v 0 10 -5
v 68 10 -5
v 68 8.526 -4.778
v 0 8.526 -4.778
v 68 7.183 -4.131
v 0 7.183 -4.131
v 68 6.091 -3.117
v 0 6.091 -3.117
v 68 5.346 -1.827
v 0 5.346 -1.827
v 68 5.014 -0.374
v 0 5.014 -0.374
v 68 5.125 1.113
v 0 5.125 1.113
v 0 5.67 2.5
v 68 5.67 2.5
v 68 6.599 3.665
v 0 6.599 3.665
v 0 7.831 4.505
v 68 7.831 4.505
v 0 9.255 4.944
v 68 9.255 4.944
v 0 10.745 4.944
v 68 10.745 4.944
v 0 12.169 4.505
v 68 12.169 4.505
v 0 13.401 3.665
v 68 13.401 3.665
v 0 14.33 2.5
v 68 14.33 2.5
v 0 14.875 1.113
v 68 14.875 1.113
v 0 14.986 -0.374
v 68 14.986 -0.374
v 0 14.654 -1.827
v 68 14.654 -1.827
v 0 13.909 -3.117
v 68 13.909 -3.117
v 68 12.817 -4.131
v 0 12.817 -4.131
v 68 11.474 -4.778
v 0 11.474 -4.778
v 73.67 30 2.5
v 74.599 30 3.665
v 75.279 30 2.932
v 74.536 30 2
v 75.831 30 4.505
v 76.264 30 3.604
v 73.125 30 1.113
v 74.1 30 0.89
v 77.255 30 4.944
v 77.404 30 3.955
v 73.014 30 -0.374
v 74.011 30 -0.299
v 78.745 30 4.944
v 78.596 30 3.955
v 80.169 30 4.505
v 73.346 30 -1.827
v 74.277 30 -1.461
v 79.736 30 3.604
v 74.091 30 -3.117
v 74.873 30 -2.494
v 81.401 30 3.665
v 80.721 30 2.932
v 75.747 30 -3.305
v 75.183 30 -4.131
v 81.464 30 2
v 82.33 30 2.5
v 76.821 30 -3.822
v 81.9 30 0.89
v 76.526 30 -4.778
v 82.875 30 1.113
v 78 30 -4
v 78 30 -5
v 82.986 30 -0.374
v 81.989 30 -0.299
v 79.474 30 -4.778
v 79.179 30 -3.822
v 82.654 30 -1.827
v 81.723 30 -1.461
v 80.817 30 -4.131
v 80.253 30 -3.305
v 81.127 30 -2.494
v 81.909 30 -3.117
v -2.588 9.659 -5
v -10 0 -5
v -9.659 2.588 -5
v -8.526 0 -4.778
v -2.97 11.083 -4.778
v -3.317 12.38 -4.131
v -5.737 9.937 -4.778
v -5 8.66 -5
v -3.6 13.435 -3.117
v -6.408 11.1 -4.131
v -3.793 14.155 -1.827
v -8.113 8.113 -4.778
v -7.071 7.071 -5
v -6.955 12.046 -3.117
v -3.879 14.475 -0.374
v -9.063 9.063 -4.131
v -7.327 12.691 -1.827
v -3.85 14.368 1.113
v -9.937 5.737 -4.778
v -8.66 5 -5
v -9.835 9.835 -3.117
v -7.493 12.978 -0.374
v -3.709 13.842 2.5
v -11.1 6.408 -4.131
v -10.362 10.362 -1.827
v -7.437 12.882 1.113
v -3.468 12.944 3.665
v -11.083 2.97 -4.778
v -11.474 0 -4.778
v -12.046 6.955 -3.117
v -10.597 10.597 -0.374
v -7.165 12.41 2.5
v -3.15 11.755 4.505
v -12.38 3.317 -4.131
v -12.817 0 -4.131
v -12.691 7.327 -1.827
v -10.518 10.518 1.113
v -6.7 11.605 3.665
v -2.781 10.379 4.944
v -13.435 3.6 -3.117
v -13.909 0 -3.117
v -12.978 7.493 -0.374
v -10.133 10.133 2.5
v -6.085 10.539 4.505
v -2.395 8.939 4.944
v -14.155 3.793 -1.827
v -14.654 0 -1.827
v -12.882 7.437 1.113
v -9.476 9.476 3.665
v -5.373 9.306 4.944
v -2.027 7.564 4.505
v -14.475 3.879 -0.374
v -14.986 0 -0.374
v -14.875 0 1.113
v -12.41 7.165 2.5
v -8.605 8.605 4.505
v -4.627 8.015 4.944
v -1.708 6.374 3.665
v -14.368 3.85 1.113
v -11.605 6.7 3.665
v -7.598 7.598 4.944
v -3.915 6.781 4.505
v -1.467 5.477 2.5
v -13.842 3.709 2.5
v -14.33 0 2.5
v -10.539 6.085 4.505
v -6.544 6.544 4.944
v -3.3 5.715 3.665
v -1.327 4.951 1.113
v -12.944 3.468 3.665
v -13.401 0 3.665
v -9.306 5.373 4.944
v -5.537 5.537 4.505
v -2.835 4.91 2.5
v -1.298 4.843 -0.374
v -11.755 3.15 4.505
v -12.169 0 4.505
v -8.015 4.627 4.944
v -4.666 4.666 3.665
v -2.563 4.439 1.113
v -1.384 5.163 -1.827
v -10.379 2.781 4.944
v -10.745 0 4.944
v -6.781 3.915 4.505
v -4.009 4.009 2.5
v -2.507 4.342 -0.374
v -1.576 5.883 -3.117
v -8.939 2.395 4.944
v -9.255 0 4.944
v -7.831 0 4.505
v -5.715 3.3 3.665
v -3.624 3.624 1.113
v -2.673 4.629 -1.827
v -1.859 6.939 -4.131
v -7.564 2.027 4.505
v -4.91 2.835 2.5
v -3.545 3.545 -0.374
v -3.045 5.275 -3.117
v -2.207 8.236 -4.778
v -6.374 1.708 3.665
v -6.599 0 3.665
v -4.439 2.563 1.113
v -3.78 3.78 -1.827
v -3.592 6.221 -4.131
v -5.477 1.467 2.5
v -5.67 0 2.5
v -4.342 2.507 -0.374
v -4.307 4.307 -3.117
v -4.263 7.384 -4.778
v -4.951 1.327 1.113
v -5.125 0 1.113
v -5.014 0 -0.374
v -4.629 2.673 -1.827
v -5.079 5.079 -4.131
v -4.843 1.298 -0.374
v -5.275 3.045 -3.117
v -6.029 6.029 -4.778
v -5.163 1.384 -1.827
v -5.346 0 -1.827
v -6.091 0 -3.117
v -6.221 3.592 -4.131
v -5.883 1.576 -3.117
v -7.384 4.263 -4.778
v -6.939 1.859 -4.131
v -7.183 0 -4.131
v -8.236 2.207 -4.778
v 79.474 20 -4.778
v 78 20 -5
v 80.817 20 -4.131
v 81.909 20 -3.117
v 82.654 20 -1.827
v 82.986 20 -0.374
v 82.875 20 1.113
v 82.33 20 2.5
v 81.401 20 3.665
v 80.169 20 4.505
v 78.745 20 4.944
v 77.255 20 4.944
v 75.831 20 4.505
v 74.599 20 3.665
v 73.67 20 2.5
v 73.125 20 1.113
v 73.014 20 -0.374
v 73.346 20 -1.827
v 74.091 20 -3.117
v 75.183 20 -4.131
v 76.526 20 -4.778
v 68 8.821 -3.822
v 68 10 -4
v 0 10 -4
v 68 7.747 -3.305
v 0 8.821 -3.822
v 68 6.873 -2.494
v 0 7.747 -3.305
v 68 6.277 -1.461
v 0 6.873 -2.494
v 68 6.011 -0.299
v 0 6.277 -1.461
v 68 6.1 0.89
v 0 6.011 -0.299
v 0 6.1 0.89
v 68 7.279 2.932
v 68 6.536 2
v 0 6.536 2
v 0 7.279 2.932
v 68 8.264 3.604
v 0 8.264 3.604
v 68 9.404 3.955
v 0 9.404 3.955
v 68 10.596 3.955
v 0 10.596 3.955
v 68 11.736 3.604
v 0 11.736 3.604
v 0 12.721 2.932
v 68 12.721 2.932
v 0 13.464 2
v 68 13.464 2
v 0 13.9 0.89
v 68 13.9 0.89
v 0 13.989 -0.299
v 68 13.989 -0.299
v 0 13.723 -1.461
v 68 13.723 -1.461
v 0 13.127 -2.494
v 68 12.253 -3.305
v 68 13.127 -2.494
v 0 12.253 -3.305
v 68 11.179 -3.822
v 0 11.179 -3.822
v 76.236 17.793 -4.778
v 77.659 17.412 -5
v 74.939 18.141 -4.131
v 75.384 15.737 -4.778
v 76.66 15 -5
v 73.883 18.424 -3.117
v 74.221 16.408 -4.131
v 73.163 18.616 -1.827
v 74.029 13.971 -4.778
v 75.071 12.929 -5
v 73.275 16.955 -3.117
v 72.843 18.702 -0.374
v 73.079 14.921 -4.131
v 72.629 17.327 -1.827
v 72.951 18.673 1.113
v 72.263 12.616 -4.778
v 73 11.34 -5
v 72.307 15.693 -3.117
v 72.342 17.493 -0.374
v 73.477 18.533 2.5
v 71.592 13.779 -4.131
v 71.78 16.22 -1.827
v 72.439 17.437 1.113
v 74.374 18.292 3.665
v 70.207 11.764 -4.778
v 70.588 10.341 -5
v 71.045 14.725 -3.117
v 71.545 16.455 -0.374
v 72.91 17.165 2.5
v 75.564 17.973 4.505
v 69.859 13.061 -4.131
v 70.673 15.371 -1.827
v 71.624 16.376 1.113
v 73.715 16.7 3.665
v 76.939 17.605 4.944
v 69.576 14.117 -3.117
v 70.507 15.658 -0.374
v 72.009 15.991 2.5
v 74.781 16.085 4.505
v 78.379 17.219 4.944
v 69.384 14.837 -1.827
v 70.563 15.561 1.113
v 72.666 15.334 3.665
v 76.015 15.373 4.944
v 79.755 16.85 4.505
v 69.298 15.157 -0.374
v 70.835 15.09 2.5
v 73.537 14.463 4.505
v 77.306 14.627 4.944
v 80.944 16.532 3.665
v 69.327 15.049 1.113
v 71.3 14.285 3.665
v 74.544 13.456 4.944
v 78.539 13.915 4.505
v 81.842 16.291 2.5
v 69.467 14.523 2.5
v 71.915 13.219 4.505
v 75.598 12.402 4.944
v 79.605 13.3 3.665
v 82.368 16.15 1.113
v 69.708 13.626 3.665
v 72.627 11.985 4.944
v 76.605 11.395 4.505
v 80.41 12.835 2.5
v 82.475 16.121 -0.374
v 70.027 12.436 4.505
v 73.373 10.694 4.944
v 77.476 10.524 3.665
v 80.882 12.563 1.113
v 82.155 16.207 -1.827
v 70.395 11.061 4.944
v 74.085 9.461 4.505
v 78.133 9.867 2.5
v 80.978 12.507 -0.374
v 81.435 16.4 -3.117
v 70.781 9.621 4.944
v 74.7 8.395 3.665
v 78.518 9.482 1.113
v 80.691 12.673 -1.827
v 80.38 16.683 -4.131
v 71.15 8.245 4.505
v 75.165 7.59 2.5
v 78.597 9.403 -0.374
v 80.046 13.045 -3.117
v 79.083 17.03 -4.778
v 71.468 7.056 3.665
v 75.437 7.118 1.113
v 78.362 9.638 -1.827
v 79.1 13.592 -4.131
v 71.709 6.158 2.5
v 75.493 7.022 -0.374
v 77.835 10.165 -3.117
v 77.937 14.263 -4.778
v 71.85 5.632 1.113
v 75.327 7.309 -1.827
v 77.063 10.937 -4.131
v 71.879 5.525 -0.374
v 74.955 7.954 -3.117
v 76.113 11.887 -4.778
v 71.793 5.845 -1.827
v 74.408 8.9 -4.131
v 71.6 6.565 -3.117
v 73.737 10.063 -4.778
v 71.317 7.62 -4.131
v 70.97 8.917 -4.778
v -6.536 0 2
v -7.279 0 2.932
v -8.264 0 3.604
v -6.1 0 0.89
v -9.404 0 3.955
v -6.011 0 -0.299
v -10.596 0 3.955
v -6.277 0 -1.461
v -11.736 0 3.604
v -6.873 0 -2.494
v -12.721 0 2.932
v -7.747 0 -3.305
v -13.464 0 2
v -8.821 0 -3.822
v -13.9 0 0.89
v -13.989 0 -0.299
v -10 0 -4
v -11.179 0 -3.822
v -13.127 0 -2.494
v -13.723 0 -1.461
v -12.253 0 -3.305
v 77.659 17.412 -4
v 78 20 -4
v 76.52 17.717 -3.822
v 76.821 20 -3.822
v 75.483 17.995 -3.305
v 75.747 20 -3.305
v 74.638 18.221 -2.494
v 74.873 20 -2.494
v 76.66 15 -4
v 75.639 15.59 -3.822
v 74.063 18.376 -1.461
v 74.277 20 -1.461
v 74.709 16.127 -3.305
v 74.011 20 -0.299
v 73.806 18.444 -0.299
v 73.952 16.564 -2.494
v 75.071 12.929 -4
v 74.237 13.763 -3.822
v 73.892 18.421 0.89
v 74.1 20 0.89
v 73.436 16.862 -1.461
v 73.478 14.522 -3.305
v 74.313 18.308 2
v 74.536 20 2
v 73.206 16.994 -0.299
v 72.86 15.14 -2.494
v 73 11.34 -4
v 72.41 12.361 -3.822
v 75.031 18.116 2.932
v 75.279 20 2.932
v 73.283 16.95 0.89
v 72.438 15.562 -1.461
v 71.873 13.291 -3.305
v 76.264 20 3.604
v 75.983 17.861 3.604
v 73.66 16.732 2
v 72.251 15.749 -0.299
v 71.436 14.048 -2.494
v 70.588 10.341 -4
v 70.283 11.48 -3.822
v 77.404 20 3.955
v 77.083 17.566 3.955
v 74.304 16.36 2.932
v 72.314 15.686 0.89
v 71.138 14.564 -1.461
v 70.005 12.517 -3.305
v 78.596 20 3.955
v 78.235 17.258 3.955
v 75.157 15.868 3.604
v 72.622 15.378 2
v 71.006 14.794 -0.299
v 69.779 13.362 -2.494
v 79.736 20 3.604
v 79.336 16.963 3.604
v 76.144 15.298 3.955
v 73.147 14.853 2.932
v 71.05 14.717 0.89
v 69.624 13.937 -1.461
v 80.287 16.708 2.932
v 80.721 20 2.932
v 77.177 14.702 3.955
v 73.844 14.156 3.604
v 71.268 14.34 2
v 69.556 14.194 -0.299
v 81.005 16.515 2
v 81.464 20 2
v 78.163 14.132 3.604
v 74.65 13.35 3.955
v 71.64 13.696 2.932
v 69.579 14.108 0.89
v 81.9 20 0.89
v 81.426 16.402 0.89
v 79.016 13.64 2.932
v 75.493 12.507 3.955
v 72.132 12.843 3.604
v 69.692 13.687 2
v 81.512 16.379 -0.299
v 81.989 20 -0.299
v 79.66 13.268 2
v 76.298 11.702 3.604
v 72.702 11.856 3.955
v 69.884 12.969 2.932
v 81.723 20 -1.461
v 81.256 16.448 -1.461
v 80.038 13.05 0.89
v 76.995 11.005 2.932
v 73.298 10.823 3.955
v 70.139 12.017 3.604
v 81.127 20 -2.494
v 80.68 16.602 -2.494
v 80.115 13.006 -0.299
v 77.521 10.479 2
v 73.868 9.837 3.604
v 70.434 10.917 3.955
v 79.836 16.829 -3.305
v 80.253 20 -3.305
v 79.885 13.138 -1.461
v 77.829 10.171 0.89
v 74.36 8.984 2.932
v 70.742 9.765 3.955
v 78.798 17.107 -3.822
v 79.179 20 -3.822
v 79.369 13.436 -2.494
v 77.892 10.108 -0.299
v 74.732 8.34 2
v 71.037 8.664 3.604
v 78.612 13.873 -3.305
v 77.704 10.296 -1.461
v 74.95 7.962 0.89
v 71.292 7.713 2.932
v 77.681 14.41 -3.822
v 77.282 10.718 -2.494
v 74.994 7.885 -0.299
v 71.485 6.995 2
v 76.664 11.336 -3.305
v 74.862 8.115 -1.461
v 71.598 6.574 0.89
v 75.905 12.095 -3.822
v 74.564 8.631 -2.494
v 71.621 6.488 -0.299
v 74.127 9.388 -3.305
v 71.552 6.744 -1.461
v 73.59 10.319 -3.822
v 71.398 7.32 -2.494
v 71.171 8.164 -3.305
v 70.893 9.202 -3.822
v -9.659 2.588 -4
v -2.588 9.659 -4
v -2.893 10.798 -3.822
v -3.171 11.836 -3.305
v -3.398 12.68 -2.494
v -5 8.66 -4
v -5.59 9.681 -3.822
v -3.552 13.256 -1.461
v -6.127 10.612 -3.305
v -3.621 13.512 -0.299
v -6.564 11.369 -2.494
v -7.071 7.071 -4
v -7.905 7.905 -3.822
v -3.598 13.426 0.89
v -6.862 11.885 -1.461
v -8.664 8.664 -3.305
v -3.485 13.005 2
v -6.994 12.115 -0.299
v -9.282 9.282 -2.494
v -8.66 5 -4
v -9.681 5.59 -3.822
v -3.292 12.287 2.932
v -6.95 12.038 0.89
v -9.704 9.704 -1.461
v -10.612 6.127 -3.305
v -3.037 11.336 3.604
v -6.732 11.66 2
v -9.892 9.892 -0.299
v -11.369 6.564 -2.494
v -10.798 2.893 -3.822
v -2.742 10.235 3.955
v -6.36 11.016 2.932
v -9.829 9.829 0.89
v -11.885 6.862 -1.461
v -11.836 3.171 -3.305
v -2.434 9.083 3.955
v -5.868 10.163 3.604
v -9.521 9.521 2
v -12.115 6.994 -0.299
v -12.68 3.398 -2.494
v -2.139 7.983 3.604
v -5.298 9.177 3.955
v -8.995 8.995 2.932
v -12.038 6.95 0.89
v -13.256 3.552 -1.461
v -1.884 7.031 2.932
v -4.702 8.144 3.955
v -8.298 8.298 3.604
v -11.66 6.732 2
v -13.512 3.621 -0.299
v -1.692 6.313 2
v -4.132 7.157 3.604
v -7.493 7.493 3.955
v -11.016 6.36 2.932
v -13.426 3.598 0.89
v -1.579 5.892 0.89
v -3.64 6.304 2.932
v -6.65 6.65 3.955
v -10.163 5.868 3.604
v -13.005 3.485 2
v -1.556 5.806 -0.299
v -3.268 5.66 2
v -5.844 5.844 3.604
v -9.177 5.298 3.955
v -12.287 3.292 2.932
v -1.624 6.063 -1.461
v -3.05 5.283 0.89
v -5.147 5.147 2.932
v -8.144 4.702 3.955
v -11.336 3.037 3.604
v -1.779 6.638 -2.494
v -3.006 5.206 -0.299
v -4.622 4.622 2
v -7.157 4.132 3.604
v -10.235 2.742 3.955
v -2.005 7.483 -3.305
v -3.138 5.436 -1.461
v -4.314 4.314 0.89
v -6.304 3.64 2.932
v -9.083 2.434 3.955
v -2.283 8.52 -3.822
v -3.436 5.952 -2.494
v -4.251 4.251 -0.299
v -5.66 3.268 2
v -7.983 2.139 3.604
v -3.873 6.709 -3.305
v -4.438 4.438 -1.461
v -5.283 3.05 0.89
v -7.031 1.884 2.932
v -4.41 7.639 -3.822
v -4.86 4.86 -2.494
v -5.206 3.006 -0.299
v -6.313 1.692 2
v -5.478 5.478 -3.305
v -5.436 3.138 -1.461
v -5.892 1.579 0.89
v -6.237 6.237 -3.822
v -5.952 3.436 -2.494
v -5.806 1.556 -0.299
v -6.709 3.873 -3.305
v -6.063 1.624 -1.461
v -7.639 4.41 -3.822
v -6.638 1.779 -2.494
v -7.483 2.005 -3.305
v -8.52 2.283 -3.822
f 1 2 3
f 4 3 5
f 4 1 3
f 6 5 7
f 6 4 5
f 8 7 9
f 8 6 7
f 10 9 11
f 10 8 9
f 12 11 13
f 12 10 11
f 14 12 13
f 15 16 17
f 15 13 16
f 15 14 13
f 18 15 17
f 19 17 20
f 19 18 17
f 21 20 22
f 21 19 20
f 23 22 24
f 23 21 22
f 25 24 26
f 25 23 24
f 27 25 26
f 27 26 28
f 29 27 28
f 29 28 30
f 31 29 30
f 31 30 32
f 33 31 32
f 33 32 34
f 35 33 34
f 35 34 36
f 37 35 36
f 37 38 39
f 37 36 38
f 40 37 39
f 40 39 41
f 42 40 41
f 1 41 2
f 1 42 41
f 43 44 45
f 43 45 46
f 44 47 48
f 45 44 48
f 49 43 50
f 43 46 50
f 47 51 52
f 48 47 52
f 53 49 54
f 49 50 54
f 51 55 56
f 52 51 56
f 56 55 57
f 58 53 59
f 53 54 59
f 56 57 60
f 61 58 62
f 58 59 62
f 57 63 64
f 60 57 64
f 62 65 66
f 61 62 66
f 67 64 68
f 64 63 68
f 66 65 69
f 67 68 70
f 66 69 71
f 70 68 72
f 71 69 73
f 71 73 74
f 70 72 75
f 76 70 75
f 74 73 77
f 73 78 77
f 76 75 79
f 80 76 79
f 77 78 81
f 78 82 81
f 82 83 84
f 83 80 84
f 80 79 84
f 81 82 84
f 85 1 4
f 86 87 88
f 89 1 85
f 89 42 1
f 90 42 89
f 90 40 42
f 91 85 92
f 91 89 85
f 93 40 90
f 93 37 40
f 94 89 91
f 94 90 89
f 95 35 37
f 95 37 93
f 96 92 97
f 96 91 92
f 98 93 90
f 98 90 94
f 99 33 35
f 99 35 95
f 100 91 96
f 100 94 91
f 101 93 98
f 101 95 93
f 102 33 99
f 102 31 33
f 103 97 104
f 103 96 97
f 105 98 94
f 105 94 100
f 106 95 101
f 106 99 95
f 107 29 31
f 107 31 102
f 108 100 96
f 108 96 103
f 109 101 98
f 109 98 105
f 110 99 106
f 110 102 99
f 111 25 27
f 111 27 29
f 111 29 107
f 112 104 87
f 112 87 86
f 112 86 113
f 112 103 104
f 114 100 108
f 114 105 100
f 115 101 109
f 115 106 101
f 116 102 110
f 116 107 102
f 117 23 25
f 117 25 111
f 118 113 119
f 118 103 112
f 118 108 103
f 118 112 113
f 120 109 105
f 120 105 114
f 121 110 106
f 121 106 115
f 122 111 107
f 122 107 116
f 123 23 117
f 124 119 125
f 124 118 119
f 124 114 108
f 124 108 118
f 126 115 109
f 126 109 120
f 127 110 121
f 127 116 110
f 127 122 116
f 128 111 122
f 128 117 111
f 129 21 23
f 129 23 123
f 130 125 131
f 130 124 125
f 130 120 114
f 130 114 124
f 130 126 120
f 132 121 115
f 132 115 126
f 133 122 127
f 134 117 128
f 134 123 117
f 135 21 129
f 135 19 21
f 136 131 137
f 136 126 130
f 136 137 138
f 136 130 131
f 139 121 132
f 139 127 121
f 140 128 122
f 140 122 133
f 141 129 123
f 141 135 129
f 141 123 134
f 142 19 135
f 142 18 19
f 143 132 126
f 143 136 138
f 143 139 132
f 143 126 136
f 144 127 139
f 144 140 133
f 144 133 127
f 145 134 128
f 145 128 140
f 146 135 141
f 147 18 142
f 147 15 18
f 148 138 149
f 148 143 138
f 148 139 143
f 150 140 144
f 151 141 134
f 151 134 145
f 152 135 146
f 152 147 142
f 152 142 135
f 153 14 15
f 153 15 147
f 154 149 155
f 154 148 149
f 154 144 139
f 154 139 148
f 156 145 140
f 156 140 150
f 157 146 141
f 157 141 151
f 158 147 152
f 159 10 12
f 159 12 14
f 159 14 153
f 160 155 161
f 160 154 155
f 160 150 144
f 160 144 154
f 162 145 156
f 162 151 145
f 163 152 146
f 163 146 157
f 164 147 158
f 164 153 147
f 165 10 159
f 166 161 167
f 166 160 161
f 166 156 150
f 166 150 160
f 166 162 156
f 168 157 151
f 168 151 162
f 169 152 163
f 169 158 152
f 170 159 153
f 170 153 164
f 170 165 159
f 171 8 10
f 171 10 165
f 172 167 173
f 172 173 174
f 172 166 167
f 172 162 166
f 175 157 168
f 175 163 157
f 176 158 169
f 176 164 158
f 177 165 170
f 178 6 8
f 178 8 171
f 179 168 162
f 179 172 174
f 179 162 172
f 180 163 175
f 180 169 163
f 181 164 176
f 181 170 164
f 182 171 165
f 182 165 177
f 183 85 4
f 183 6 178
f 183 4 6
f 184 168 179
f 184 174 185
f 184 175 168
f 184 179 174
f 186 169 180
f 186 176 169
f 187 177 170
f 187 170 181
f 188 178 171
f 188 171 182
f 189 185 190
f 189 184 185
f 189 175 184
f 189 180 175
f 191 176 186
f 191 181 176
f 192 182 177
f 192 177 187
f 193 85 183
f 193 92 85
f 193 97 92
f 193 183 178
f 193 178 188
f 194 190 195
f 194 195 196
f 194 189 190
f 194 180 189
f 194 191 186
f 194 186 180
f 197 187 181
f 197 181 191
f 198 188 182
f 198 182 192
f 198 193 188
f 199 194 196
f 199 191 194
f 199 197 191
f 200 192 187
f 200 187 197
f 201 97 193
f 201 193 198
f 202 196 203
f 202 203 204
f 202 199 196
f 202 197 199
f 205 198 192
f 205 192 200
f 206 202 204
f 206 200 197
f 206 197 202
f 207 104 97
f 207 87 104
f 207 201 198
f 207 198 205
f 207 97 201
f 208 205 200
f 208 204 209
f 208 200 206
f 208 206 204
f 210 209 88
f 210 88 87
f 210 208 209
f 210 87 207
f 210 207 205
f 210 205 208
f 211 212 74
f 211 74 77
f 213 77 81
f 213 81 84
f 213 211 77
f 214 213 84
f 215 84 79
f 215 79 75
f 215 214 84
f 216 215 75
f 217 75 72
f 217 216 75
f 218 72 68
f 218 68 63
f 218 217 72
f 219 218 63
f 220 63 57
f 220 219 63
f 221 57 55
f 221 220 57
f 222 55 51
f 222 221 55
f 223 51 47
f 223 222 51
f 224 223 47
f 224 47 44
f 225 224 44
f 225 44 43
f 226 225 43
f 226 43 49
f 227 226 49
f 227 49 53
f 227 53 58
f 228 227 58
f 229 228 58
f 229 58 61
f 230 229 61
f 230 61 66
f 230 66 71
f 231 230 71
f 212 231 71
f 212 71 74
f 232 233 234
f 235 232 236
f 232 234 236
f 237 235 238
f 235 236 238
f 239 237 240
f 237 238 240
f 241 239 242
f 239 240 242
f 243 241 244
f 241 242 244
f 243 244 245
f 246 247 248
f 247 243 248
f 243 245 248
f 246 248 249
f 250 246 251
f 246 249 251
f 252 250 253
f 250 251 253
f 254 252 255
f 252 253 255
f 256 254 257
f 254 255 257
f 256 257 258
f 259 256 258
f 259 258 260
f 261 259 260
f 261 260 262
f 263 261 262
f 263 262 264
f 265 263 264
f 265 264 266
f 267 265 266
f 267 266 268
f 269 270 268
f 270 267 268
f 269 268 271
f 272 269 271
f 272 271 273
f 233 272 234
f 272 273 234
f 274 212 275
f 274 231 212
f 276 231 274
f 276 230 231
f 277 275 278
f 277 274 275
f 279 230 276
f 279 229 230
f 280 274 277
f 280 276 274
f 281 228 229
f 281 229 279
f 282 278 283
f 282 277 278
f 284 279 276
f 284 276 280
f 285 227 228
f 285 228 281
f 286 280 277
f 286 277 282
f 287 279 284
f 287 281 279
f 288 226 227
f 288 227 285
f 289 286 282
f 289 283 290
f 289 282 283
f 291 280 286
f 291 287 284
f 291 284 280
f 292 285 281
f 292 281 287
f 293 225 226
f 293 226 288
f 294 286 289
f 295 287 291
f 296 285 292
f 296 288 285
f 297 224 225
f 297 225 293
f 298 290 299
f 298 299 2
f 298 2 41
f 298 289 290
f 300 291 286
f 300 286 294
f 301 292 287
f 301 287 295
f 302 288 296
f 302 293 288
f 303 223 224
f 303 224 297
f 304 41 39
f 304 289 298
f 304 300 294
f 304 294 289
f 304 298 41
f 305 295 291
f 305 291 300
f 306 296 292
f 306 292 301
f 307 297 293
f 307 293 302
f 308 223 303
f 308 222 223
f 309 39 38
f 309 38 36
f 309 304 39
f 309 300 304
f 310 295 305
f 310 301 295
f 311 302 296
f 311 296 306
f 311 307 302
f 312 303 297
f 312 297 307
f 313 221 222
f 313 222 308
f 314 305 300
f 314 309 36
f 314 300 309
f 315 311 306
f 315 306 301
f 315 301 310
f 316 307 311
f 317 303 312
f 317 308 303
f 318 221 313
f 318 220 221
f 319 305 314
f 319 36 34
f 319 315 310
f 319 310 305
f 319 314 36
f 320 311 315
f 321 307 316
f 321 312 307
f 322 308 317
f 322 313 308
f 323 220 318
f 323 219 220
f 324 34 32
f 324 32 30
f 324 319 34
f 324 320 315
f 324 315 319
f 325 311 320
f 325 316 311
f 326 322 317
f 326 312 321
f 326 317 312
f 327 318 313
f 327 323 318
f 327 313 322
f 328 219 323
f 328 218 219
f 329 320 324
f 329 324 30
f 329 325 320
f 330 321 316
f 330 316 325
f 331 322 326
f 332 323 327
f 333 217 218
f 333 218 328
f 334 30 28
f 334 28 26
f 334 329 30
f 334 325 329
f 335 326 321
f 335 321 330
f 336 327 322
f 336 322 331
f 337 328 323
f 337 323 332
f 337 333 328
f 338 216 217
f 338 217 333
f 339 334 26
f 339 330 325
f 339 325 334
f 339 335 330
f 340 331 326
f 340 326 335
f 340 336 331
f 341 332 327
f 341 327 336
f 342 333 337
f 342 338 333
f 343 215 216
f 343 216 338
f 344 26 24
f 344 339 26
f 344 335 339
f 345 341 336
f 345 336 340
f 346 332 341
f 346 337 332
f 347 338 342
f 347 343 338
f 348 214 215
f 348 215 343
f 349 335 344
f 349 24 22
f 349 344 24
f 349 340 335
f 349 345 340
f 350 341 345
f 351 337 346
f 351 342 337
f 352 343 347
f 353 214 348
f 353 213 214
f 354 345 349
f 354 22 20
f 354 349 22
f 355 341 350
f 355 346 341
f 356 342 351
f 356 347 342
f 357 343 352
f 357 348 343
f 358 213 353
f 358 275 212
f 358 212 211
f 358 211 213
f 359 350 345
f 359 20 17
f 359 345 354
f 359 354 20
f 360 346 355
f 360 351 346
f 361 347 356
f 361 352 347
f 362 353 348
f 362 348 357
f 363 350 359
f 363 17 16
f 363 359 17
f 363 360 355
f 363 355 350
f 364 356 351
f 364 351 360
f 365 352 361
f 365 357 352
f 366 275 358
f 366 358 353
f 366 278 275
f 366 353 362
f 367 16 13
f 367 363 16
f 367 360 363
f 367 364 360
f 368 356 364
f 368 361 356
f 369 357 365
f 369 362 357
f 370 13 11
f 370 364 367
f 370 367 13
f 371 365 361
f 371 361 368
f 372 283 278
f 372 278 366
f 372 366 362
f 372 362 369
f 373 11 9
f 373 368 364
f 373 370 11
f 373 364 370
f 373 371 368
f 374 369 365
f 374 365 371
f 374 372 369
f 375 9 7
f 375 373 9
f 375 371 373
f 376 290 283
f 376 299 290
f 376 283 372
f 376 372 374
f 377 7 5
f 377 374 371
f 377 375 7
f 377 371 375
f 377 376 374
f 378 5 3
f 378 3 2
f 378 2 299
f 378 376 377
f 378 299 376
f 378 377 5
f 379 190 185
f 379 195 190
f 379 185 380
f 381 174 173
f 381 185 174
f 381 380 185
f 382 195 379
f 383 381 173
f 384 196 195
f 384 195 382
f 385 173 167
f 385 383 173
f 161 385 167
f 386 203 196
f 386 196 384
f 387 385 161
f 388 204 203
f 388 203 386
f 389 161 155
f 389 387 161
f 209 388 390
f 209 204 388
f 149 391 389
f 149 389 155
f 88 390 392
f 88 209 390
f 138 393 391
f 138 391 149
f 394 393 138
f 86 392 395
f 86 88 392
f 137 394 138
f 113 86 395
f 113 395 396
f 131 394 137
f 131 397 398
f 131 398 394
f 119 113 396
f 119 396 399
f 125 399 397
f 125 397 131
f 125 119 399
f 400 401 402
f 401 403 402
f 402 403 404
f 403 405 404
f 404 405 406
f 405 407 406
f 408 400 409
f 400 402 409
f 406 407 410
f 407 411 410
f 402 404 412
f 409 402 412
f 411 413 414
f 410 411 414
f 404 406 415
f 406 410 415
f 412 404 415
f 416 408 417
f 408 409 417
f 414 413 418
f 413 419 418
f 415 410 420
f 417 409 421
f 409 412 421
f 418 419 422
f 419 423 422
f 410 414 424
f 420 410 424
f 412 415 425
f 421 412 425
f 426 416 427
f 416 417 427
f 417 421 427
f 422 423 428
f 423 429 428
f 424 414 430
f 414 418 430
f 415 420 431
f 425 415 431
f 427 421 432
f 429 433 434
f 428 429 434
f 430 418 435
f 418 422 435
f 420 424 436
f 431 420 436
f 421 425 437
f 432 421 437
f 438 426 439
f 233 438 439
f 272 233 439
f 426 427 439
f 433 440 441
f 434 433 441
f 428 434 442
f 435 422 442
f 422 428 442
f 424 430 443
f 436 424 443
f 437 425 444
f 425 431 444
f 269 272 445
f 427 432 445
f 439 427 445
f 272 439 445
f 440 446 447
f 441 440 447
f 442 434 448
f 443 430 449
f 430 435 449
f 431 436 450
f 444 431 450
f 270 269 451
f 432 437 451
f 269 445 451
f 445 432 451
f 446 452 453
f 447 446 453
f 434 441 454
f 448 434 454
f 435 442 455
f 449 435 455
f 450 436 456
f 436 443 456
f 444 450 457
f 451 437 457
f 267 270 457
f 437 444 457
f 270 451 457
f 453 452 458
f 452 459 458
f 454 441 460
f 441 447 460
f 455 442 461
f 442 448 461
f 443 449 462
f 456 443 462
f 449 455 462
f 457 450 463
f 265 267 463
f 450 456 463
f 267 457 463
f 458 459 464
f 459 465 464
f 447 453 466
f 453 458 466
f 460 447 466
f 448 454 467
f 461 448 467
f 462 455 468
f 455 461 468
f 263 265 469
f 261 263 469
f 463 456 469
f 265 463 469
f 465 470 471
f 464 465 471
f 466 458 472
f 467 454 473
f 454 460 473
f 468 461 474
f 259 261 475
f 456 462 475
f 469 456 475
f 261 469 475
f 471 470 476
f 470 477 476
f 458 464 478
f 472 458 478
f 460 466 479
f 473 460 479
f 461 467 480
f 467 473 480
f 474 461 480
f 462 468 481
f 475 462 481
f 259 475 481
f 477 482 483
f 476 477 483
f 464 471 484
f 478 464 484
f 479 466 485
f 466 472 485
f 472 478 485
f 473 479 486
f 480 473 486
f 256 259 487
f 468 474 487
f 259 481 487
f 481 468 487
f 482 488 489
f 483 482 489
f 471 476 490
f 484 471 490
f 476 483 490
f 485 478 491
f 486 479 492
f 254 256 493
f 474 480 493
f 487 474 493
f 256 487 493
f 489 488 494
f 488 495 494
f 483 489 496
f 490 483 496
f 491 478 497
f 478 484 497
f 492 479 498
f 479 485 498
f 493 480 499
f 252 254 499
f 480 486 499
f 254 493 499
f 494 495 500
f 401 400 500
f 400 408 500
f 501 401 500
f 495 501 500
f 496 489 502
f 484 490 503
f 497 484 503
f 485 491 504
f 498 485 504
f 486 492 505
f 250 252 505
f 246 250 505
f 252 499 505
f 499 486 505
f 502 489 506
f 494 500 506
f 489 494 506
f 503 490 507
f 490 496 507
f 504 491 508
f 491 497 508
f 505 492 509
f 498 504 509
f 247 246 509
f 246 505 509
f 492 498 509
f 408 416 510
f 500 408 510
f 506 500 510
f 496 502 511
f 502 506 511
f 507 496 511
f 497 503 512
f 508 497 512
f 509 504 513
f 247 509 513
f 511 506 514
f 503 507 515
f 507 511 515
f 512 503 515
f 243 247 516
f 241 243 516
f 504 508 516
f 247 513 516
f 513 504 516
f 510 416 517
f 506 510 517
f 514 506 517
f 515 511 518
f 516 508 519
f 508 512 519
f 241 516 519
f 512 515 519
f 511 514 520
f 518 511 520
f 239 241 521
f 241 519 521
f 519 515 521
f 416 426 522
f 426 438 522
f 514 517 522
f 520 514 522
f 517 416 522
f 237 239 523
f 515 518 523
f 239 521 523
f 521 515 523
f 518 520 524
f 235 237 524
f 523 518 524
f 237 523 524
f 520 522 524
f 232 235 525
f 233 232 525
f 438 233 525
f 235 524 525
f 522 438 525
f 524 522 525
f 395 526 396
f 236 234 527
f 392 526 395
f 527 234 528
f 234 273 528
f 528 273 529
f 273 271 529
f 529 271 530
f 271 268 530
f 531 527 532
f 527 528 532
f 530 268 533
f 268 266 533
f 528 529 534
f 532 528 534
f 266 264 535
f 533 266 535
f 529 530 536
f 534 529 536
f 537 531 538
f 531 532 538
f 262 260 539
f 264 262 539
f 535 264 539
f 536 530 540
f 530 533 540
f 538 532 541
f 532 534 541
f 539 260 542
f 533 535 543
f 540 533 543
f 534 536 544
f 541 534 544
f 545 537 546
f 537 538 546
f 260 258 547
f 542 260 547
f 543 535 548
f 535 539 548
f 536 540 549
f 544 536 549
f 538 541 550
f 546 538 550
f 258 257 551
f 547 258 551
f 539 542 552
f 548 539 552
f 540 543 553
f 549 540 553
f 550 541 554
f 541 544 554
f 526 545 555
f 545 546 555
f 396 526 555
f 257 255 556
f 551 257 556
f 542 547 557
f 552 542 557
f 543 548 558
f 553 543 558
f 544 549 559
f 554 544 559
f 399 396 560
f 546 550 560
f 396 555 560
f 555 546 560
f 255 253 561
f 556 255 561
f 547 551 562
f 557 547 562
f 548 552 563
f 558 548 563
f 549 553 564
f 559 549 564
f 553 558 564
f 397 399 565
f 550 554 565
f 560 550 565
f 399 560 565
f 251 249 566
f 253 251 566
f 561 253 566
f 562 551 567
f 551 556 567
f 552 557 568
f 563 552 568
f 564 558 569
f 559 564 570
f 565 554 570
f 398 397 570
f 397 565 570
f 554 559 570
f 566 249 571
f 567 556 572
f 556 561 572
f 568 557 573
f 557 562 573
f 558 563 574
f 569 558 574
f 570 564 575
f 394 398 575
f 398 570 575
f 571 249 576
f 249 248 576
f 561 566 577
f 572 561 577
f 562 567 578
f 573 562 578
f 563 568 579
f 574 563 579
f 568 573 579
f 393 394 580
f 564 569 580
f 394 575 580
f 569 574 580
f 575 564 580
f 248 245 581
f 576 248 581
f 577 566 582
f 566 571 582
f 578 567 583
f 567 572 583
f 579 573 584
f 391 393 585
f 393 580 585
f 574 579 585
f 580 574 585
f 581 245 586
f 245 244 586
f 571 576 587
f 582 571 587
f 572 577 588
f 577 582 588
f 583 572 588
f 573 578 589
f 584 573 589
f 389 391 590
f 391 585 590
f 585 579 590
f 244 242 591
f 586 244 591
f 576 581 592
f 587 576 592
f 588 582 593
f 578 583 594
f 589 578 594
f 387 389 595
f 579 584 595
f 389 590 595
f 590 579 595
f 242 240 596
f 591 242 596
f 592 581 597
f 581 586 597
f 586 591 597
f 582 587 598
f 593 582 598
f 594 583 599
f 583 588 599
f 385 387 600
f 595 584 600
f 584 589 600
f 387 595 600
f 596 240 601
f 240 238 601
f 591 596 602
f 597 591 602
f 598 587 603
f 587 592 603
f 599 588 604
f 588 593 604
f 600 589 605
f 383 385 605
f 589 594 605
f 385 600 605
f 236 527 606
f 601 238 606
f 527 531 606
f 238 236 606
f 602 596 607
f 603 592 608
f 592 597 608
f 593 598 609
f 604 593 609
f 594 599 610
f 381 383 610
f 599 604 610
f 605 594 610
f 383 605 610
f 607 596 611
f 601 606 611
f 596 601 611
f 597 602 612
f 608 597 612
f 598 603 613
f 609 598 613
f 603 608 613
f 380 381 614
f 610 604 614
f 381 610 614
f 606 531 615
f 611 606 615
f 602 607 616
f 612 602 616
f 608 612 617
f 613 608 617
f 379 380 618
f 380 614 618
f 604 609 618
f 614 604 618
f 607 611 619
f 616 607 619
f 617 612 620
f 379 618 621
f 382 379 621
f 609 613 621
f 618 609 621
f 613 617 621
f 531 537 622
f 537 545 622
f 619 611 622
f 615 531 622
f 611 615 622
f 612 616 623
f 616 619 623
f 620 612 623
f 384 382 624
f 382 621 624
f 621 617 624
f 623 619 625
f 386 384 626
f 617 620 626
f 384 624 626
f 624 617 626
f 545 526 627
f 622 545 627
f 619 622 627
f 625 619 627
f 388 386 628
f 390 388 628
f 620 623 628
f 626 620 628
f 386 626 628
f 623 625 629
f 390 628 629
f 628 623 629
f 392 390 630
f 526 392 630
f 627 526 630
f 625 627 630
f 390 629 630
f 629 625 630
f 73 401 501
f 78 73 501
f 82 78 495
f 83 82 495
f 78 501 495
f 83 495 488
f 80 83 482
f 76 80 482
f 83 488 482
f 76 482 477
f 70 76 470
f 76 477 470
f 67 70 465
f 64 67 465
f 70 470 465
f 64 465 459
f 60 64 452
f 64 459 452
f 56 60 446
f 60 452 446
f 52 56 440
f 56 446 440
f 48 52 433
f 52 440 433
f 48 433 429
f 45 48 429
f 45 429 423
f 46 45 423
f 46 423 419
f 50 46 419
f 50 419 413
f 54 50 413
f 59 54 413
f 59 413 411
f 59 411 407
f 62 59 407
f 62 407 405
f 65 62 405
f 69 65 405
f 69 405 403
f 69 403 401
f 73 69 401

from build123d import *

# Parameters (mm, degrees)
SWEEP_1_PROFILE_R   = 5
SWEEP_1_PROFILE_R_2 = 4


with BuildPart() as part:
    # 扫描-薄件1: sweep along a path in 草图1
    with BuildLine(Plane.XY) as sweep_1_path:
        Line((78, 30), (78, 20))
        ThreePointArc((78, 20), (75.071067812, 12.928932188), (68, 10))
        Line((68, 10), (0, 10))
        ThreePointArc((0, 10), (-7.071067812, 7.071067812), (-10, 0))
    # 扫描-薄件1 profile (on start of the path) → 扫描-薄件1 (sweep)
    with BuildSketch(Plane(origin=(78, 30, 0), x_dir=(0, 0, -1), z_dir=(0, -1, 0))):
        Circle(SWEEP_1_PROFILE_R)
        Circle(SWEEP_1_PROFILE_R_2, mode=Mode.SUBTRACT)
    sweep(path=sweep_1_path.line)


solid = part.part
